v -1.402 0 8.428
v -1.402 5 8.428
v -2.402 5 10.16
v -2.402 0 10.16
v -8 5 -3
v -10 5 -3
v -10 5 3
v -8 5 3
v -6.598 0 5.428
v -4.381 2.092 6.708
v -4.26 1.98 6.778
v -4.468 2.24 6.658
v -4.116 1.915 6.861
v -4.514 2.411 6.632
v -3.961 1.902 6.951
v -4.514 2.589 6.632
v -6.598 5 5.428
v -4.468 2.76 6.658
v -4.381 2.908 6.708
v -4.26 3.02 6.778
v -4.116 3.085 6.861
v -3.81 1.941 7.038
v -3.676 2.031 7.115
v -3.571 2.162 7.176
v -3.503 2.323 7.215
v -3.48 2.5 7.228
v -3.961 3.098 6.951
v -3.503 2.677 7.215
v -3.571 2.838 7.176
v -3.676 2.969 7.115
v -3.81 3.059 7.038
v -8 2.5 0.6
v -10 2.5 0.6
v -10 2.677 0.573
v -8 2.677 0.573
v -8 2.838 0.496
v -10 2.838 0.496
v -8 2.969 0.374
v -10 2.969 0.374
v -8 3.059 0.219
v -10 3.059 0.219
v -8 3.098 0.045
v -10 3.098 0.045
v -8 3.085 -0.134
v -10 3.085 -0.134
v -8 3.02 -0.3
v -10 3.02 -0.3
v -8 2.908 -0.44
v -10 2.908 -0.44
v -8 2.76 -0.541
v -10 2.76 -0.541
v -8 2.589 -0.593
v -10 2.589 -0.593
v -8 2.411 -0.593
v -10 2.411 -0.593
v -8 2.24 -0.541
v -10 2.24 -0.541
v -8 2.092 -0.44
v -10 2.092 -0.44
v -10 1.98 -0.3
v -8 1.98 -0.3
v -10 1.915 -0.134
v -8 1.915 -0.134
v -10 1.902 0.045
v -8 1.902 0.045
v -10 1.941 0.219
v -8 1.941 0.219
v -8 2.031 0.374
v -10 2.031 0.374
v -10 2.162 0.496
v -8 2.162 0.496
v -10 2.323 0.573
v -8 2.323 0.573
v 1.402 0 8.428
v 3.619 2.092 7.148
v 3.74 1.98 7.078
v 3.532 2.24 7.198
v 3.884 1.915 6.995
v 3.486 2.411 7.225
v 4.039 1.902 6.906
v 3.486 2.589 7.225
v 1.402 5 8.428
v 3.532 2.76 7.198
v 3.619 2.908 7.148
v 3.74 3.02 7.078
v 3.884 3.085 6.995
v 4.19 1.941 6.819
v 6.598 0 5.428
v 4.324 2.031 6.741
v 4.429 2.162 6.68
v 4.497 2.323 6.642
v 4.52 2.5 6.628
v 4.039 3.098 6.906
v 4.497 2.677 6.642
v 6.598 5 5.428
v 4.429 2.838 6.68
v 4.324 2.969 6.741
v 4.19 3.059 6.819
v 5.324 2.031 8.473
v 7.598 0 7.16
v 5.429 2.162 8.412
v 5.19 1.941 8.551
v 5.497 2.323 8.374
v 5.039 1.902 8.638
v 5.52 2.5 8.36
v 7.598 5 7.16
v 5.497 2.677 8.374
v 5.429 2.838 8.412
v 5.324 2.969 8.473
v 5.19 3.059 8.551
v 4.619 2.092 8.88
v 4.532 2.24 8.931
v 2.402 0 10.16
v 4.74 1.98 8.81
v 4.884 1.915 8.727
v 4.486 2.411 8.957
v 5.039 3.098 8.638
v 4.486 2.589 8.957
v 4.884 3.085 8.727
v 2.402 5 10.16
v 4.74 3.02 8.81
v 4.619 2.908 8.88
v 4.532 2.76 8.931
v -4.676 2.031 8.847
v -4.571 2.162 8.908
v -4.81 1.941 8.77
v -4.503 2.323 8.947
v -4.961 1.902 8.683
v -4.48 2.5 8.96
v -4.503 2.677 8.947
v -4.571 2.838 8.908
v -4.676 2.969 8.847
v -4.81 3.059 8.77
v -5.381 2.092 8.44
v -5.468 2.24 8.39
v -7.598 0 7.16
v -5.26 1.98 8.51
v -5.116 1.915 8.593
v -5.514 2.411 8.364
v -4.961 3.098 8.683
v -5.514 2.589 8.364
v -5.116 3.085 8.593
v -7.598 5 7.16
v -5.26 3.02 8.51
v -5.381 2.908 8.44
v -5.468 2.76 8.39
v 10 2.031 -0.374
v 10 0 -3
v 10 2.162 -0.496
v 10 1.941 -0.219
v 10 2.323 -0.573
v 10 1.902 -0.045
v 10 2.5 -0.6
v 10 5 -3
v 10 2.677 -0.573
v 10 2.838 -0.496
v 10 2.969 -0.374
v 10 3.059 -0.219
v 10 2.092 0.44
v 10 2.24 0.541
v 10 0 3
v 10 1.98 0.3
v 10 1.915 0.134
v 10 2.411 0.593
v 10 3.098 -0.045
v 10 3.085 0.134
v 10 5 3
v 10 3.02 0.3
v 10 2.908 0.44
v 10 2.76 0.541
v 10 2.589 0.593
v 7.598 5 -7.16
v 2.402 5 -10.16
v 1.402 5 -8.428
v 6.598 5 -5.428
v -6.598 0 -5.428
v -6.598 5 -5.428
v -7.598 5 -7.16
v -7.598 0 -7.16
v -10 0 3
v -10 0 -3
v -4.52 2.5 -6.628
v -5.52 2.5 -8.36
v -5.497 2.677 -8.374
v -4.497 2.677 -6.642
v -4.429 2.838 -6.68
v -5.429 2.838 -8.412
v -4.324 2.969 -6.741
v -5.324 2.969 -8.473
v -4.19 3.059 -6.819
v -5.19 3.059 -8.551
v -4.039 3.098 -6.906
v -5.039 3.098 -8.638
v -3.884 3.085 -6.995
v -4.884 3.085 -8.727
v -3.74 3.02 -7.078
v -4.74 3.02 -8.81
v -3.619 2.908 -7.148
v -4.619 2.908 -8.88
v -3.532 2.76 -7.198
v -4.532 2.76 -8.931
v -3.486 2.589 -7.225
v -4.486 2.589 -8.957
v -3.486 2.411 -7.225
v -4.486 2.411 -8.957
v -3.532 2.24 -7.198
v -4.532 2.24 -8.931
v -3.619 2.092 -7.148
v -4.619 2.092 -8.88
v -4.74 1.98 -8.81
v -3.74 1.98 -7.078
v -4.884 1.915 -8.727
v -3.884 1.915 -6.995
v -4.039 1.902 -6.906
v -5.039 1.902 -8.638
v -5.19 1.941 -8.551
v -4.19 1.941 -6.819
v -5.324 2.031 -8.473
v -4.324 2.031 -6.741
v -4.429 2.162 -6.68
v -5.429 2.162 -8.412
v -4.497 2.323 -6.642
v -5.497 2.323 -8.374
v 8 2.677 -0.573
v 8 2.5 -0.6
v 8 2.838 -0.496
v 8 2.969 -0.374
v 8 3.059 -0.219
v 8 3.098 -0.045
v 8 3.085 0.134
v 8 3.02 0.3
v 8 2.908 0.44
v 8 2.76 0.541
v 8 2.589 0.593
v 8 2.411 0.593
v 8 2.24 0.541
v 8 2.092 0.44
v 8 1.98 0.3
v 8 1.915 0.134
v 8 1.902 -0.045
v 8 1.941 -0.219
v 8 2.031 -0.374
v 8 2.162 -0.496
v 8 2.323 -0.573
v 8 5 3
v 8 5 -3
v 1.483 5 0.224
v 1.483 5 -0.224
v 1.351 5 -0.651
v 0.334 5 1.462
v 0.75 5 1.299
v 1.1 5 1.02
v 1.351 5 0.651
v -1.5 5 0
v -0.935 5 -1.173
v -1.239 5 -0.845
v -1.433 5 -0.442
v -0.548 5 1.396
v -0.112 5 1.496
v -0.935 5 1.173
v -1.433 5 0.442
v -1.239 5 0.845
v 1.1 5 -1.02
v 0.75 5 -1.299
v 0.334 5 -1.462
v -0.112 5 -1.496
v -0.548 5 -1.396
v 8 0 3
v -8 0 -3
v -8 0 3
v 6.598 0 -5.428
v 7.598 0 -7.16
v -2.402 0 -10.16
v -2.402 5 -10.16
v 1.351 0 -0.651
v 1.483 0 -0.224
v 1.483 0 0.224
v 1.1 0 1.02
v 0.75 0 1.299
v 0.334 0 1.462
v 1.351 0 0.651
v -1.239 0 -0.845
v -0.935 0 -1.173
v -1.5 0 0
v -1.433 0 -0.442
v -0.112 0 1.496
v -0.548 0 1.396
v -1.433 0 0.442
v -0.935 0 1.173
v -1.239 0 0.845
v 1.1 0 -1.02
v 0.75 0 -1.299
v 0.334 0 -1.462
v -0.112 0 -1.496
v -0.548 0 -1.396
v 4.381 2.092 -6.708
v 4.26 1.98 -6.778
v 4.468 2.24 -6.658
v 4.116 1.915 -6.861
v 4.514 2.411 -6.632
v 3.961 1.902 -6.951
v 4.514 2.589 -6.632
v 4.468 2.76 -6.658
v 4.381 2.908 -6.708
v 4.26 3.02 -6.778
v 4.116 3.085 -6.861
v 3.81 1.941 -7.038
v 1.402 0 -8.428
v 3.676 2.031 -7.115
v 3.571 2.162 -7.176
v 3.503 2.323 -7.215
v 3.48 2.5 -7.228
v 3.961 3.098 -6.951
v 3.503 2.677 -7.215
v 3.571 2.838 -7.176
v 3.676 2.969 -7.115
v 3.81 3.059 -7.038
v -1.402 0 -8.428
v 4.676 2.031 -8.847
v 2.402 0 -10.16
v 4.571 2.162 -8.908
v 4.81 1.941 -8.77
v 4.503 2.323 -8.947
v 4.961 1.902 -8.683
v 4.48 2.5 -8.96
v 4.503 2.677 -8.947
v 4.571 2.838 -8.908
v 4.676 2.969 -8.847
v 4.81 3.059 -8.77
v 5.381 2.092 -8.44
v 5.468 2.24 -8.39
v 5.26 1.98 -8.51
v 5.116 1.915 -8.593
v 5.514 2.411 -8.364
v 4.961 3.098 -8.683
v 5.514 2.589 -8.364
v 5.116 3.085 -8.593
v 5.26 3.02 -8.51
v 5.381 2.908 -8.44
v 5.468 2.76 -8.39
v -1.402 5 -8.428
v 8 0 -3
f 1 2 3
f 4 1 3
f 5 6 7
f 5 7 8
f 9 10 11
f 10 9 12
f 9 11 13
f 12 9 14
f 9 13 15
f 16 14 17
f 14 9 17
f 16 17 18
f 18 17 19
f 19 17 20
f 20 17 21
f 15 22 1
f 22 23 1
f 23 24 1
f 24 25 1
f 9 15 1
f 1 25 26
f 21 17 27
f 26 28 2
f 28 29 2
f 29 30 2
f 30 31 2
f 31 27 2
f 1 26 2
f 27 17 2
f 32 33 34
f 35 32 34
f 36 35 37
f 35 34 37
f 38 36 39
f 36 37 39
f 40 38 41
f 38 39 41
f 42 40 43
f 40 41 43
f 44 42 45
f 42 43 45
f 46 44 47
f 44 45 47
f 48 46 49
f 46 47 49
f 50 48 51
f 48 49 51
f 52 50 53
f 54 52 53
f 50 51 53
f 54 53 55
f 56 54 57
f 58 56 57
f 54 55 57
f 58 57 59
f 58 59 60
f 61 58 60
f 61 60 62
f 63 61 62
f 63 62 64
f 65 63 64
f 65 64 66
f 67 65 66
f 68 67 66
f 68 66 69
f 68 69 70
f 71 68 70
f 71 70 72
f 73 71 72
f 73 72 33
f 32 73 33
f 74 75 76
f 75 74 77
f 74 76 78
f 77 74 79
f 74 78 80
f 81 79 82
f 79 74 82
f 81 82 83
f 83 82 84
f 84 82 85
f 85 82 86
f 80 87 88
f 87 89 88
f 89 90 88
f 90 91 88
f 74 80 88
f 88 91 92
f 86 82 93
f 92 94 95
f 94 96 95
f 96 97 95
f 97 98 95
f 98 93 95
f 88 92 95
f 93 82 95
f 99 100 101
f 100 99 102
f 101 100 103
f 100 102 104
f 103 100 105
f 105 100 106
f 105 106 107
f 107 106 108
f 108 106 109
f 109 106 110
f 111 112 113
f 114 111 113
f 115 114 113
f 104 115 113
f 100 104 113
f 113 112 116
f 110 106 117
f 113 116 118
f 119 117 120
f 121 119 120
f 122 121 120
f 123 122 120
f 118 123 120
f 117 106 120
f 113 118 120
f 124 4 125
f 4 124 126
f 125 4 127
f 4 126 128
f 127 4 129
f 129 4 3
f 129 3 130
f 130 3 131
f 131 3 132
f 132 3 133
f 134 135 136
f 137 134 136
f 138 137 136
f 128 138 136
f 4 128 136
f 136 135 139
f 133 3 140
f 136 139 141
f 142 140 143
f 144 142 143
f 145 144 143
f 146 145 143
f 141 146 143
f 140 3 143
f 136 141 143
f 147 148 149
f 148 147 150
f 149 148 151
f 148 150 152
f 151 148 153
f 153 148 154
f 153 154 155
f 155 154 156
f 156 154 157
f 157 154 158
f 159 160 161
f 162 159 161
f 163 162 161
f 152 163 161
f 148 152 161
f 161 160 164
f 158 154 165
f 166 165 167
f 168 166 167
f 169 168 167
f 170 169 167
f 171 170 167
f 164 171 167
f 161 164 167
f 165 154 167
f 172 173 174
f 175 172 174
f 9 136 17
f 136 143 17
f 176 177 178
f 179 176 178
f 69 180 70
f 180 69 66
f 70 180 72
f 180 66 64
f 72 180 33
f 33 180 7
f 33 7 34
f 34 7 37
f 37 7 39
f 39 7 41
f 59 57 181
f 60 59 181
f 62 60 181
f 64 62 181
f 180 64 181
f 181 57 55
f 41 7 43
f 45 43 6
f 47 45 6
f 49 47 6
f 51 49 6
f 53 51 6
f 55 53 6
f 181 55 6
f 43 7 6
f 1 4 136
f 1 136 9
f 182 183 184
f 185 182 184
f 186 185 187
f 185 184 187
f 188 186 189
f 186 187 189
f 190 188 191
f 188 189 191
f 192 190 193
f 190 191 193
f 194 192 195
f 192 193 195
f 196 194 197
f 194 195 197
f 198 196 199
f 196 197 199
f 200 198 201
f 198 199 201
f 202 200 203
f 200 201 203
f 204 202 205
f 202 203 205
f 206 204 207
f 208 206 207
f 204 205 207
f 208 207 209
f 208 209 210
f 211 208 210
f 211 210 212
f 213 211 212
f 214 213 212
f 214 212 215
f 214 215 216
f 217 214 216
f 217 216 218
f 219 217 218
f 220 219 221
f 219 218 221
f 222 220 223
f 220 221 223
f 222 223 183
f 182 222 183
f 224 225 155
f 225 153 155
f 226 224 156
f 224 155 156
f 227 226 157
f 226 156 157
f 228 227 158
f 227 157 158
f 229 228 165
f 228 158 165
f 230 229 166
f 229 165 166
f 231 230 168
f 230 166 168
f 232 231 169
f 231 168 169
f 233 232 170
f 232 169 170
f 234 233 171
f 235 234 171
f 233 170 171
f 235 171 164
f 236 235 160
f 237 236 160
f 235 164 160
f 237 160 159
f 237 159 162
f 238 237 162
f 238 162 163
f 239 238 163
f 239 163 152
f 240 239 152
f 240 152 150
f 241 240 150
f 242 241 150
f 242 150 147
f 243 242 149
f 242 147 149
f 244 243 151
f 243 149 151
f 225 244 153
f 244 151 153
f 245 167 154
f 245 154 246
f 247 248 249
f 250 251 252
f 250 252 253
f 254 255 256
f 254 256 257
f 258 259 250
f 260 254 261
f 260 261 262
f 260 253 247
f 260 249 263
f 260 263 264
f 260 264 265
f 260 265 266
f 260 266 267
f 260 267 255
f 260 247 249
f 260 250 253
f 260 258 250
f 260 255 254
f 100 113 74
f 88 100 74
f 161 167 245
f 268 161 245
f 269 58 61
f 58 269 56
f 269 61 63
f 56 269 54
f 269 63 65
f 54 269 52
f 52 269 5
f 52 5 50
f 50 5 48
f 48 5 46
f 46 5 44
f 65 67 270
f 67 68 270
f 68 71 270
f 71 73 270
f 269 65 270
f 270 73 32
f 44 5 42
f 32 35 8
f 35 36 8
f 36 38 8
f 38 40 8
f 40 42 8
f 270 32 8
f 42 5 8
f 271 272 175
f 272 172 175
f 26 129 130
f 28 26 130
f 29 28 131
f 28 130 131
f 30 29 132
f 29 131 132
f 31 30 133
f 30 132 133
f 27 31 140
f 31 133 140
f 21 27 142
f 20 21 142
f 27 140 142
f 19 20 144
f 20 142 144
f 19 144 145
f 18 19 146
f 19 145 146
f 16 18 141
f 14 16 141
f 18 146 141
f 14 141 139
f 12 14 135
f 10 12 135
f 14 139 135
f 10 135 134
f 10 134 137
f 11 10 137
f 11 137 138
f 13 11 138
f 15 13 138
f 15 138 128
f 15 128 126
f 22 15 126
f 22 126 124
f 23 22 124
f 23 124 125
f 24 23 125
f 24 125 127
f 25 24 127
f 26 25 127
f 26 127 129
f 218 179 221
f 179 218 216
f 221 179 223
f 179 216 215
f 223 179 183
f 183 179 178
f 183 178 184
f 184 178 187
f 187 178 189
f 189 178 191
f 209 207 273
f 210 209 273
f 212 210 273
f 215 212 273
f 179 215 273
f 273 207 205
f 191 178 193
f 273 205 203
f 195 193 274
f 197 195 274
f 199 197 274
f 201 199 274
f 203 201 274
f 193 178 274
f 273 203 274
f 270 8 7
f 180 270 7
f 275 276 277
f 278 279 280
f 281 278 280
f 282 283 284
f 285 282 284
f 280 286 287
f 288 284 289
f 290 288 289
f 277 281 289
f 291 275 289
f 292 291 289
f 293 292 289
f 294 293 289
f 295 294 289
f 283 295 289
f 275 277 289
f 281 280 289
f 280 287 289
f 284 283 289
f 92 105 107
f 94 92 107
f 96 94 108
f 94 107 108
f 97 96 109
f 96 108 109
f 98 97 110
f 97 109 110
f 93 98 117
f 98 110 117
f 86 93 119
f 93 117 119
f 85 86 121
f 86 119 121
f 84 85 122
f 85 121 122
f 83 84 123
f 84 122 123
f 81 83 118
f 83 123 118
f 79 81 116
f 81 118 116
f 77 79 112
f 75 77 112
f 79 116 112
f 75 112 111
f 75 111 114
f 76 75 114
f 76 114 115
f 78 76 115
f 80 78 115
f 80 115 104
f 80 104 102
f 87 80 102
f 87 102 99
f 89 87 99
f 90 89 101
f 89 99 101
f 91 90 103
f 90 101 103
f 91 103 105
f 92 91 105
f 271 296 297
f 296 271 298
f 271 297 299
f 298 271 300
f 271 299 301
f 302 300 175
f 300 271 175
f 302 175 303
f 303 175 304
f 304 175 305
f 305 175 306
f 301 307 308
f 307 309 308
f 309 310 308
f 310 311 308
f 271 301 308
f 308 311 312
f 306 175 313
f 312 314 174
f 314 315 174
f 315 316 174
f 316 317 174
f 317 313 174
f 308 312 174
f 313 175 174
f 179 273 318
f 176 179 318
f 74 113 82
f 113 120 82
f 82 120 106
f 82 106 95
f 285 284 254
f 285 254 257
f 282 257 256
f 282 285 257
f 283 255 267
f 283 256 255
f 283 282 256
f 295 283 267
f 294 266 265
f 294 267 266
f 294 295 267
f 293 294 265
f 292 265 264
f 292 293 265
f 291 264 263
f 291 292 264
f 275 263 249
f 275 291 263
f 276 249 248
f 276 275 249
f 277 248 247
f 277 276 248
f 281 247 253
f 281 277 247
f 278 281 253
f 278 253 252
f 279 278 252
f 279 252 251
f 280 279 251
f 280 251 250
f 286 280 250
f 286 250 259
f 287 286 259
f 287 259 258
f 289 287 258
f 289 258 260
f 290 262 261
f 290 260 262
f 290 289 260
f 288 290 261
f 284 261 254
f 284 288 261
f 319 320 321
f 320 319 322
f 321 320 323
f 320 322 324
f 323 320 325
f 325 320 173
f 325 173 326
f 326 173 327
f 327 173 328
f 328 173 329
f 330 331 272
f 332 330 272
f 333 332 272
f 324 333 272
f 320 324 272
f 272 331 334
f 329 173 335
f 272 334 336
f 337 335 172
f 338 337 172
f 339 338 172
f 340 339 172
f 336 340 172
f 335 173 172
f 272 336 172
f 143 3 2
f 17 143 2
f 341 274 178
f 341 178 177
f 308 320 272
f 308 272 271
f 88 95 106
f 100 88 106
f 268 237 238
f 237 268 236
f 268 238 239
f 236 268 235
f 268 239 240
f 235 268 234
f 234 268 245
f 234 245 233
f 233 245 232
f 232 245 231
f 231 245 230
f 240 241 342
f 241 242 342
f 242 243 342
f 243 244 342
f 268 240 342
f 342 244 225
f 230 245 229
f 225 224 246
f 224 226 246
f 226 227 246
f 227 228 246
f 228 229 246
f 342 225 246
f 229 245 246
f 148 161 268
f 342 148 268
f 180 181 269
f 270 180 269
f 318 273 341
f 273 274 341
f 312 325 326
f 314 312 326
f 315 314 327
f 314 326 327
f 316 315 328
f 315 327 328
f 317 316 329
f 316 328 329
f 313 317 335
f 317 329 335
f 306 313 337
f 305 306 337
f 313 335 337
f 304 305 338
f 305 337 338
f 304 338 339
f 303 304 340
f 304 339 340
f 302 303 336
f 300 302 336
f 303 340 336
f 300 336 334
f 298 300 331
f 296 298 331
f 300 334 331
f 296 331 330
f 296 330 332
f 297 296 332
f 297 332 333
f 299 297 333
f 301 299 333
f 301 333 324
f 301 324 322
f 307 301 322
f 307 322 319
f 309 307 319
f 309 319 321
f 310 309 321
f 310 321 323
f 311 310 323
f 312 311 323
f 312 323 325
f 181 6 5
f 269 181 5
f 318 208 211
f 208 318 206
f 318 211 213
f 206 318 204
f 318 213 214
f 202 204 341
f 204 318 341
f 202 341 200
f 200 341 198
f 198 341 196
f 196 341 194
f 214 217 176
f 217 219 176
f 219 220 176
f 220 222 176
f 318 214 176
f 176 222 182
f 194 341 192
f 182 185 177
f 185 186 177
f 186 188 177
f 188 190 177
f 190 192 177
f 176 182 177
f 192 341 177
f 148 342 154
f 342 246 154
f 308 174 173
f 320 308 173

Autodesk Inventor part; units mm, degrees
ref_plane "YZ Plane" through (0, 0, 0) normal (1, 0, 0) x (0, 1, 0)
ref_plane "XZ Plane" through (0, 0, 0) normal (0, 1, 0) x (-1, 0, 0)
ref_plane "XY Plane" through (0, 0, 0) normal (0, 0, 1) x (1, 0, 0)
sketch "Sketch1" plane through (0, 0, 0) normal (0, 1, 0) x (-1, 0, 0)
  circle A0 centre (0, 0) radius 1.5
  dimension "d0" = 3
extrude "Extrusion1" add sketch "Sketch1" along normal blind 5
sketch "Sketch2" plane through (0, 5, 0) normal (0, 1, 0) x (1, 0, 0)
  line L0 (0, 0) -> (-10, 0)
  line L1 (-10, 0) -> (-9, 0)
  line L2 (-8, -3) -> (-10, -3)
  line L3 (-10, -3) -> (-10, 3)
  line L4 (-10, 3) -> (-8, 3)
  line L5 (-8, 3) -> (-8, -3)
  line L6 (-8, -3) -> (-10, 3) construction
  line L7 (-10, -3) -> (-8, 3) construction
  dimension "d3" = 10
  dimension "d4" = 1
  dimension "d5" = 2
  dimension "d6" = 6
extrude "Extrusion2" add sketch "Sketch2" against normal up to surface (5 mm away)
pattern_circular "Circular Pattern1" count 6 over 360 about axis through (0, 0, 0) along (0, 1, 0) of "Extrusion2"
sketch "Sketch3" plane through (10, 5, 3) normal (1, 0, 0) x (0, 0, -1)
  line L0 (6, -5) -> (0, -5) projected
  line L1 (6, 0) -> (6, -5) projected
  line L2 (0, 0) -> (6, 0) projected
  line L3 (0, 0) -> (0, -5) projected
  line L4 (0, 0) -> (0, -5) projected
  line L5 (0, -2.5) -> (3, -2.5)
  circle A0 centre (3, -2.5) radius 0.6
  point P0 (3, -5)
  dimension "d12" = 3
  dimension "d13" = 1.2
extrude "Extrusion3" cut sketch "Sketch3" against normal blind 5 contours A0
pattern_circular "Circular Pattern2" count 6 over 360 about axis through (0, 0, 0) along (0, 1, 0) of "Extrusion3"
properties part number "up_10mm"
